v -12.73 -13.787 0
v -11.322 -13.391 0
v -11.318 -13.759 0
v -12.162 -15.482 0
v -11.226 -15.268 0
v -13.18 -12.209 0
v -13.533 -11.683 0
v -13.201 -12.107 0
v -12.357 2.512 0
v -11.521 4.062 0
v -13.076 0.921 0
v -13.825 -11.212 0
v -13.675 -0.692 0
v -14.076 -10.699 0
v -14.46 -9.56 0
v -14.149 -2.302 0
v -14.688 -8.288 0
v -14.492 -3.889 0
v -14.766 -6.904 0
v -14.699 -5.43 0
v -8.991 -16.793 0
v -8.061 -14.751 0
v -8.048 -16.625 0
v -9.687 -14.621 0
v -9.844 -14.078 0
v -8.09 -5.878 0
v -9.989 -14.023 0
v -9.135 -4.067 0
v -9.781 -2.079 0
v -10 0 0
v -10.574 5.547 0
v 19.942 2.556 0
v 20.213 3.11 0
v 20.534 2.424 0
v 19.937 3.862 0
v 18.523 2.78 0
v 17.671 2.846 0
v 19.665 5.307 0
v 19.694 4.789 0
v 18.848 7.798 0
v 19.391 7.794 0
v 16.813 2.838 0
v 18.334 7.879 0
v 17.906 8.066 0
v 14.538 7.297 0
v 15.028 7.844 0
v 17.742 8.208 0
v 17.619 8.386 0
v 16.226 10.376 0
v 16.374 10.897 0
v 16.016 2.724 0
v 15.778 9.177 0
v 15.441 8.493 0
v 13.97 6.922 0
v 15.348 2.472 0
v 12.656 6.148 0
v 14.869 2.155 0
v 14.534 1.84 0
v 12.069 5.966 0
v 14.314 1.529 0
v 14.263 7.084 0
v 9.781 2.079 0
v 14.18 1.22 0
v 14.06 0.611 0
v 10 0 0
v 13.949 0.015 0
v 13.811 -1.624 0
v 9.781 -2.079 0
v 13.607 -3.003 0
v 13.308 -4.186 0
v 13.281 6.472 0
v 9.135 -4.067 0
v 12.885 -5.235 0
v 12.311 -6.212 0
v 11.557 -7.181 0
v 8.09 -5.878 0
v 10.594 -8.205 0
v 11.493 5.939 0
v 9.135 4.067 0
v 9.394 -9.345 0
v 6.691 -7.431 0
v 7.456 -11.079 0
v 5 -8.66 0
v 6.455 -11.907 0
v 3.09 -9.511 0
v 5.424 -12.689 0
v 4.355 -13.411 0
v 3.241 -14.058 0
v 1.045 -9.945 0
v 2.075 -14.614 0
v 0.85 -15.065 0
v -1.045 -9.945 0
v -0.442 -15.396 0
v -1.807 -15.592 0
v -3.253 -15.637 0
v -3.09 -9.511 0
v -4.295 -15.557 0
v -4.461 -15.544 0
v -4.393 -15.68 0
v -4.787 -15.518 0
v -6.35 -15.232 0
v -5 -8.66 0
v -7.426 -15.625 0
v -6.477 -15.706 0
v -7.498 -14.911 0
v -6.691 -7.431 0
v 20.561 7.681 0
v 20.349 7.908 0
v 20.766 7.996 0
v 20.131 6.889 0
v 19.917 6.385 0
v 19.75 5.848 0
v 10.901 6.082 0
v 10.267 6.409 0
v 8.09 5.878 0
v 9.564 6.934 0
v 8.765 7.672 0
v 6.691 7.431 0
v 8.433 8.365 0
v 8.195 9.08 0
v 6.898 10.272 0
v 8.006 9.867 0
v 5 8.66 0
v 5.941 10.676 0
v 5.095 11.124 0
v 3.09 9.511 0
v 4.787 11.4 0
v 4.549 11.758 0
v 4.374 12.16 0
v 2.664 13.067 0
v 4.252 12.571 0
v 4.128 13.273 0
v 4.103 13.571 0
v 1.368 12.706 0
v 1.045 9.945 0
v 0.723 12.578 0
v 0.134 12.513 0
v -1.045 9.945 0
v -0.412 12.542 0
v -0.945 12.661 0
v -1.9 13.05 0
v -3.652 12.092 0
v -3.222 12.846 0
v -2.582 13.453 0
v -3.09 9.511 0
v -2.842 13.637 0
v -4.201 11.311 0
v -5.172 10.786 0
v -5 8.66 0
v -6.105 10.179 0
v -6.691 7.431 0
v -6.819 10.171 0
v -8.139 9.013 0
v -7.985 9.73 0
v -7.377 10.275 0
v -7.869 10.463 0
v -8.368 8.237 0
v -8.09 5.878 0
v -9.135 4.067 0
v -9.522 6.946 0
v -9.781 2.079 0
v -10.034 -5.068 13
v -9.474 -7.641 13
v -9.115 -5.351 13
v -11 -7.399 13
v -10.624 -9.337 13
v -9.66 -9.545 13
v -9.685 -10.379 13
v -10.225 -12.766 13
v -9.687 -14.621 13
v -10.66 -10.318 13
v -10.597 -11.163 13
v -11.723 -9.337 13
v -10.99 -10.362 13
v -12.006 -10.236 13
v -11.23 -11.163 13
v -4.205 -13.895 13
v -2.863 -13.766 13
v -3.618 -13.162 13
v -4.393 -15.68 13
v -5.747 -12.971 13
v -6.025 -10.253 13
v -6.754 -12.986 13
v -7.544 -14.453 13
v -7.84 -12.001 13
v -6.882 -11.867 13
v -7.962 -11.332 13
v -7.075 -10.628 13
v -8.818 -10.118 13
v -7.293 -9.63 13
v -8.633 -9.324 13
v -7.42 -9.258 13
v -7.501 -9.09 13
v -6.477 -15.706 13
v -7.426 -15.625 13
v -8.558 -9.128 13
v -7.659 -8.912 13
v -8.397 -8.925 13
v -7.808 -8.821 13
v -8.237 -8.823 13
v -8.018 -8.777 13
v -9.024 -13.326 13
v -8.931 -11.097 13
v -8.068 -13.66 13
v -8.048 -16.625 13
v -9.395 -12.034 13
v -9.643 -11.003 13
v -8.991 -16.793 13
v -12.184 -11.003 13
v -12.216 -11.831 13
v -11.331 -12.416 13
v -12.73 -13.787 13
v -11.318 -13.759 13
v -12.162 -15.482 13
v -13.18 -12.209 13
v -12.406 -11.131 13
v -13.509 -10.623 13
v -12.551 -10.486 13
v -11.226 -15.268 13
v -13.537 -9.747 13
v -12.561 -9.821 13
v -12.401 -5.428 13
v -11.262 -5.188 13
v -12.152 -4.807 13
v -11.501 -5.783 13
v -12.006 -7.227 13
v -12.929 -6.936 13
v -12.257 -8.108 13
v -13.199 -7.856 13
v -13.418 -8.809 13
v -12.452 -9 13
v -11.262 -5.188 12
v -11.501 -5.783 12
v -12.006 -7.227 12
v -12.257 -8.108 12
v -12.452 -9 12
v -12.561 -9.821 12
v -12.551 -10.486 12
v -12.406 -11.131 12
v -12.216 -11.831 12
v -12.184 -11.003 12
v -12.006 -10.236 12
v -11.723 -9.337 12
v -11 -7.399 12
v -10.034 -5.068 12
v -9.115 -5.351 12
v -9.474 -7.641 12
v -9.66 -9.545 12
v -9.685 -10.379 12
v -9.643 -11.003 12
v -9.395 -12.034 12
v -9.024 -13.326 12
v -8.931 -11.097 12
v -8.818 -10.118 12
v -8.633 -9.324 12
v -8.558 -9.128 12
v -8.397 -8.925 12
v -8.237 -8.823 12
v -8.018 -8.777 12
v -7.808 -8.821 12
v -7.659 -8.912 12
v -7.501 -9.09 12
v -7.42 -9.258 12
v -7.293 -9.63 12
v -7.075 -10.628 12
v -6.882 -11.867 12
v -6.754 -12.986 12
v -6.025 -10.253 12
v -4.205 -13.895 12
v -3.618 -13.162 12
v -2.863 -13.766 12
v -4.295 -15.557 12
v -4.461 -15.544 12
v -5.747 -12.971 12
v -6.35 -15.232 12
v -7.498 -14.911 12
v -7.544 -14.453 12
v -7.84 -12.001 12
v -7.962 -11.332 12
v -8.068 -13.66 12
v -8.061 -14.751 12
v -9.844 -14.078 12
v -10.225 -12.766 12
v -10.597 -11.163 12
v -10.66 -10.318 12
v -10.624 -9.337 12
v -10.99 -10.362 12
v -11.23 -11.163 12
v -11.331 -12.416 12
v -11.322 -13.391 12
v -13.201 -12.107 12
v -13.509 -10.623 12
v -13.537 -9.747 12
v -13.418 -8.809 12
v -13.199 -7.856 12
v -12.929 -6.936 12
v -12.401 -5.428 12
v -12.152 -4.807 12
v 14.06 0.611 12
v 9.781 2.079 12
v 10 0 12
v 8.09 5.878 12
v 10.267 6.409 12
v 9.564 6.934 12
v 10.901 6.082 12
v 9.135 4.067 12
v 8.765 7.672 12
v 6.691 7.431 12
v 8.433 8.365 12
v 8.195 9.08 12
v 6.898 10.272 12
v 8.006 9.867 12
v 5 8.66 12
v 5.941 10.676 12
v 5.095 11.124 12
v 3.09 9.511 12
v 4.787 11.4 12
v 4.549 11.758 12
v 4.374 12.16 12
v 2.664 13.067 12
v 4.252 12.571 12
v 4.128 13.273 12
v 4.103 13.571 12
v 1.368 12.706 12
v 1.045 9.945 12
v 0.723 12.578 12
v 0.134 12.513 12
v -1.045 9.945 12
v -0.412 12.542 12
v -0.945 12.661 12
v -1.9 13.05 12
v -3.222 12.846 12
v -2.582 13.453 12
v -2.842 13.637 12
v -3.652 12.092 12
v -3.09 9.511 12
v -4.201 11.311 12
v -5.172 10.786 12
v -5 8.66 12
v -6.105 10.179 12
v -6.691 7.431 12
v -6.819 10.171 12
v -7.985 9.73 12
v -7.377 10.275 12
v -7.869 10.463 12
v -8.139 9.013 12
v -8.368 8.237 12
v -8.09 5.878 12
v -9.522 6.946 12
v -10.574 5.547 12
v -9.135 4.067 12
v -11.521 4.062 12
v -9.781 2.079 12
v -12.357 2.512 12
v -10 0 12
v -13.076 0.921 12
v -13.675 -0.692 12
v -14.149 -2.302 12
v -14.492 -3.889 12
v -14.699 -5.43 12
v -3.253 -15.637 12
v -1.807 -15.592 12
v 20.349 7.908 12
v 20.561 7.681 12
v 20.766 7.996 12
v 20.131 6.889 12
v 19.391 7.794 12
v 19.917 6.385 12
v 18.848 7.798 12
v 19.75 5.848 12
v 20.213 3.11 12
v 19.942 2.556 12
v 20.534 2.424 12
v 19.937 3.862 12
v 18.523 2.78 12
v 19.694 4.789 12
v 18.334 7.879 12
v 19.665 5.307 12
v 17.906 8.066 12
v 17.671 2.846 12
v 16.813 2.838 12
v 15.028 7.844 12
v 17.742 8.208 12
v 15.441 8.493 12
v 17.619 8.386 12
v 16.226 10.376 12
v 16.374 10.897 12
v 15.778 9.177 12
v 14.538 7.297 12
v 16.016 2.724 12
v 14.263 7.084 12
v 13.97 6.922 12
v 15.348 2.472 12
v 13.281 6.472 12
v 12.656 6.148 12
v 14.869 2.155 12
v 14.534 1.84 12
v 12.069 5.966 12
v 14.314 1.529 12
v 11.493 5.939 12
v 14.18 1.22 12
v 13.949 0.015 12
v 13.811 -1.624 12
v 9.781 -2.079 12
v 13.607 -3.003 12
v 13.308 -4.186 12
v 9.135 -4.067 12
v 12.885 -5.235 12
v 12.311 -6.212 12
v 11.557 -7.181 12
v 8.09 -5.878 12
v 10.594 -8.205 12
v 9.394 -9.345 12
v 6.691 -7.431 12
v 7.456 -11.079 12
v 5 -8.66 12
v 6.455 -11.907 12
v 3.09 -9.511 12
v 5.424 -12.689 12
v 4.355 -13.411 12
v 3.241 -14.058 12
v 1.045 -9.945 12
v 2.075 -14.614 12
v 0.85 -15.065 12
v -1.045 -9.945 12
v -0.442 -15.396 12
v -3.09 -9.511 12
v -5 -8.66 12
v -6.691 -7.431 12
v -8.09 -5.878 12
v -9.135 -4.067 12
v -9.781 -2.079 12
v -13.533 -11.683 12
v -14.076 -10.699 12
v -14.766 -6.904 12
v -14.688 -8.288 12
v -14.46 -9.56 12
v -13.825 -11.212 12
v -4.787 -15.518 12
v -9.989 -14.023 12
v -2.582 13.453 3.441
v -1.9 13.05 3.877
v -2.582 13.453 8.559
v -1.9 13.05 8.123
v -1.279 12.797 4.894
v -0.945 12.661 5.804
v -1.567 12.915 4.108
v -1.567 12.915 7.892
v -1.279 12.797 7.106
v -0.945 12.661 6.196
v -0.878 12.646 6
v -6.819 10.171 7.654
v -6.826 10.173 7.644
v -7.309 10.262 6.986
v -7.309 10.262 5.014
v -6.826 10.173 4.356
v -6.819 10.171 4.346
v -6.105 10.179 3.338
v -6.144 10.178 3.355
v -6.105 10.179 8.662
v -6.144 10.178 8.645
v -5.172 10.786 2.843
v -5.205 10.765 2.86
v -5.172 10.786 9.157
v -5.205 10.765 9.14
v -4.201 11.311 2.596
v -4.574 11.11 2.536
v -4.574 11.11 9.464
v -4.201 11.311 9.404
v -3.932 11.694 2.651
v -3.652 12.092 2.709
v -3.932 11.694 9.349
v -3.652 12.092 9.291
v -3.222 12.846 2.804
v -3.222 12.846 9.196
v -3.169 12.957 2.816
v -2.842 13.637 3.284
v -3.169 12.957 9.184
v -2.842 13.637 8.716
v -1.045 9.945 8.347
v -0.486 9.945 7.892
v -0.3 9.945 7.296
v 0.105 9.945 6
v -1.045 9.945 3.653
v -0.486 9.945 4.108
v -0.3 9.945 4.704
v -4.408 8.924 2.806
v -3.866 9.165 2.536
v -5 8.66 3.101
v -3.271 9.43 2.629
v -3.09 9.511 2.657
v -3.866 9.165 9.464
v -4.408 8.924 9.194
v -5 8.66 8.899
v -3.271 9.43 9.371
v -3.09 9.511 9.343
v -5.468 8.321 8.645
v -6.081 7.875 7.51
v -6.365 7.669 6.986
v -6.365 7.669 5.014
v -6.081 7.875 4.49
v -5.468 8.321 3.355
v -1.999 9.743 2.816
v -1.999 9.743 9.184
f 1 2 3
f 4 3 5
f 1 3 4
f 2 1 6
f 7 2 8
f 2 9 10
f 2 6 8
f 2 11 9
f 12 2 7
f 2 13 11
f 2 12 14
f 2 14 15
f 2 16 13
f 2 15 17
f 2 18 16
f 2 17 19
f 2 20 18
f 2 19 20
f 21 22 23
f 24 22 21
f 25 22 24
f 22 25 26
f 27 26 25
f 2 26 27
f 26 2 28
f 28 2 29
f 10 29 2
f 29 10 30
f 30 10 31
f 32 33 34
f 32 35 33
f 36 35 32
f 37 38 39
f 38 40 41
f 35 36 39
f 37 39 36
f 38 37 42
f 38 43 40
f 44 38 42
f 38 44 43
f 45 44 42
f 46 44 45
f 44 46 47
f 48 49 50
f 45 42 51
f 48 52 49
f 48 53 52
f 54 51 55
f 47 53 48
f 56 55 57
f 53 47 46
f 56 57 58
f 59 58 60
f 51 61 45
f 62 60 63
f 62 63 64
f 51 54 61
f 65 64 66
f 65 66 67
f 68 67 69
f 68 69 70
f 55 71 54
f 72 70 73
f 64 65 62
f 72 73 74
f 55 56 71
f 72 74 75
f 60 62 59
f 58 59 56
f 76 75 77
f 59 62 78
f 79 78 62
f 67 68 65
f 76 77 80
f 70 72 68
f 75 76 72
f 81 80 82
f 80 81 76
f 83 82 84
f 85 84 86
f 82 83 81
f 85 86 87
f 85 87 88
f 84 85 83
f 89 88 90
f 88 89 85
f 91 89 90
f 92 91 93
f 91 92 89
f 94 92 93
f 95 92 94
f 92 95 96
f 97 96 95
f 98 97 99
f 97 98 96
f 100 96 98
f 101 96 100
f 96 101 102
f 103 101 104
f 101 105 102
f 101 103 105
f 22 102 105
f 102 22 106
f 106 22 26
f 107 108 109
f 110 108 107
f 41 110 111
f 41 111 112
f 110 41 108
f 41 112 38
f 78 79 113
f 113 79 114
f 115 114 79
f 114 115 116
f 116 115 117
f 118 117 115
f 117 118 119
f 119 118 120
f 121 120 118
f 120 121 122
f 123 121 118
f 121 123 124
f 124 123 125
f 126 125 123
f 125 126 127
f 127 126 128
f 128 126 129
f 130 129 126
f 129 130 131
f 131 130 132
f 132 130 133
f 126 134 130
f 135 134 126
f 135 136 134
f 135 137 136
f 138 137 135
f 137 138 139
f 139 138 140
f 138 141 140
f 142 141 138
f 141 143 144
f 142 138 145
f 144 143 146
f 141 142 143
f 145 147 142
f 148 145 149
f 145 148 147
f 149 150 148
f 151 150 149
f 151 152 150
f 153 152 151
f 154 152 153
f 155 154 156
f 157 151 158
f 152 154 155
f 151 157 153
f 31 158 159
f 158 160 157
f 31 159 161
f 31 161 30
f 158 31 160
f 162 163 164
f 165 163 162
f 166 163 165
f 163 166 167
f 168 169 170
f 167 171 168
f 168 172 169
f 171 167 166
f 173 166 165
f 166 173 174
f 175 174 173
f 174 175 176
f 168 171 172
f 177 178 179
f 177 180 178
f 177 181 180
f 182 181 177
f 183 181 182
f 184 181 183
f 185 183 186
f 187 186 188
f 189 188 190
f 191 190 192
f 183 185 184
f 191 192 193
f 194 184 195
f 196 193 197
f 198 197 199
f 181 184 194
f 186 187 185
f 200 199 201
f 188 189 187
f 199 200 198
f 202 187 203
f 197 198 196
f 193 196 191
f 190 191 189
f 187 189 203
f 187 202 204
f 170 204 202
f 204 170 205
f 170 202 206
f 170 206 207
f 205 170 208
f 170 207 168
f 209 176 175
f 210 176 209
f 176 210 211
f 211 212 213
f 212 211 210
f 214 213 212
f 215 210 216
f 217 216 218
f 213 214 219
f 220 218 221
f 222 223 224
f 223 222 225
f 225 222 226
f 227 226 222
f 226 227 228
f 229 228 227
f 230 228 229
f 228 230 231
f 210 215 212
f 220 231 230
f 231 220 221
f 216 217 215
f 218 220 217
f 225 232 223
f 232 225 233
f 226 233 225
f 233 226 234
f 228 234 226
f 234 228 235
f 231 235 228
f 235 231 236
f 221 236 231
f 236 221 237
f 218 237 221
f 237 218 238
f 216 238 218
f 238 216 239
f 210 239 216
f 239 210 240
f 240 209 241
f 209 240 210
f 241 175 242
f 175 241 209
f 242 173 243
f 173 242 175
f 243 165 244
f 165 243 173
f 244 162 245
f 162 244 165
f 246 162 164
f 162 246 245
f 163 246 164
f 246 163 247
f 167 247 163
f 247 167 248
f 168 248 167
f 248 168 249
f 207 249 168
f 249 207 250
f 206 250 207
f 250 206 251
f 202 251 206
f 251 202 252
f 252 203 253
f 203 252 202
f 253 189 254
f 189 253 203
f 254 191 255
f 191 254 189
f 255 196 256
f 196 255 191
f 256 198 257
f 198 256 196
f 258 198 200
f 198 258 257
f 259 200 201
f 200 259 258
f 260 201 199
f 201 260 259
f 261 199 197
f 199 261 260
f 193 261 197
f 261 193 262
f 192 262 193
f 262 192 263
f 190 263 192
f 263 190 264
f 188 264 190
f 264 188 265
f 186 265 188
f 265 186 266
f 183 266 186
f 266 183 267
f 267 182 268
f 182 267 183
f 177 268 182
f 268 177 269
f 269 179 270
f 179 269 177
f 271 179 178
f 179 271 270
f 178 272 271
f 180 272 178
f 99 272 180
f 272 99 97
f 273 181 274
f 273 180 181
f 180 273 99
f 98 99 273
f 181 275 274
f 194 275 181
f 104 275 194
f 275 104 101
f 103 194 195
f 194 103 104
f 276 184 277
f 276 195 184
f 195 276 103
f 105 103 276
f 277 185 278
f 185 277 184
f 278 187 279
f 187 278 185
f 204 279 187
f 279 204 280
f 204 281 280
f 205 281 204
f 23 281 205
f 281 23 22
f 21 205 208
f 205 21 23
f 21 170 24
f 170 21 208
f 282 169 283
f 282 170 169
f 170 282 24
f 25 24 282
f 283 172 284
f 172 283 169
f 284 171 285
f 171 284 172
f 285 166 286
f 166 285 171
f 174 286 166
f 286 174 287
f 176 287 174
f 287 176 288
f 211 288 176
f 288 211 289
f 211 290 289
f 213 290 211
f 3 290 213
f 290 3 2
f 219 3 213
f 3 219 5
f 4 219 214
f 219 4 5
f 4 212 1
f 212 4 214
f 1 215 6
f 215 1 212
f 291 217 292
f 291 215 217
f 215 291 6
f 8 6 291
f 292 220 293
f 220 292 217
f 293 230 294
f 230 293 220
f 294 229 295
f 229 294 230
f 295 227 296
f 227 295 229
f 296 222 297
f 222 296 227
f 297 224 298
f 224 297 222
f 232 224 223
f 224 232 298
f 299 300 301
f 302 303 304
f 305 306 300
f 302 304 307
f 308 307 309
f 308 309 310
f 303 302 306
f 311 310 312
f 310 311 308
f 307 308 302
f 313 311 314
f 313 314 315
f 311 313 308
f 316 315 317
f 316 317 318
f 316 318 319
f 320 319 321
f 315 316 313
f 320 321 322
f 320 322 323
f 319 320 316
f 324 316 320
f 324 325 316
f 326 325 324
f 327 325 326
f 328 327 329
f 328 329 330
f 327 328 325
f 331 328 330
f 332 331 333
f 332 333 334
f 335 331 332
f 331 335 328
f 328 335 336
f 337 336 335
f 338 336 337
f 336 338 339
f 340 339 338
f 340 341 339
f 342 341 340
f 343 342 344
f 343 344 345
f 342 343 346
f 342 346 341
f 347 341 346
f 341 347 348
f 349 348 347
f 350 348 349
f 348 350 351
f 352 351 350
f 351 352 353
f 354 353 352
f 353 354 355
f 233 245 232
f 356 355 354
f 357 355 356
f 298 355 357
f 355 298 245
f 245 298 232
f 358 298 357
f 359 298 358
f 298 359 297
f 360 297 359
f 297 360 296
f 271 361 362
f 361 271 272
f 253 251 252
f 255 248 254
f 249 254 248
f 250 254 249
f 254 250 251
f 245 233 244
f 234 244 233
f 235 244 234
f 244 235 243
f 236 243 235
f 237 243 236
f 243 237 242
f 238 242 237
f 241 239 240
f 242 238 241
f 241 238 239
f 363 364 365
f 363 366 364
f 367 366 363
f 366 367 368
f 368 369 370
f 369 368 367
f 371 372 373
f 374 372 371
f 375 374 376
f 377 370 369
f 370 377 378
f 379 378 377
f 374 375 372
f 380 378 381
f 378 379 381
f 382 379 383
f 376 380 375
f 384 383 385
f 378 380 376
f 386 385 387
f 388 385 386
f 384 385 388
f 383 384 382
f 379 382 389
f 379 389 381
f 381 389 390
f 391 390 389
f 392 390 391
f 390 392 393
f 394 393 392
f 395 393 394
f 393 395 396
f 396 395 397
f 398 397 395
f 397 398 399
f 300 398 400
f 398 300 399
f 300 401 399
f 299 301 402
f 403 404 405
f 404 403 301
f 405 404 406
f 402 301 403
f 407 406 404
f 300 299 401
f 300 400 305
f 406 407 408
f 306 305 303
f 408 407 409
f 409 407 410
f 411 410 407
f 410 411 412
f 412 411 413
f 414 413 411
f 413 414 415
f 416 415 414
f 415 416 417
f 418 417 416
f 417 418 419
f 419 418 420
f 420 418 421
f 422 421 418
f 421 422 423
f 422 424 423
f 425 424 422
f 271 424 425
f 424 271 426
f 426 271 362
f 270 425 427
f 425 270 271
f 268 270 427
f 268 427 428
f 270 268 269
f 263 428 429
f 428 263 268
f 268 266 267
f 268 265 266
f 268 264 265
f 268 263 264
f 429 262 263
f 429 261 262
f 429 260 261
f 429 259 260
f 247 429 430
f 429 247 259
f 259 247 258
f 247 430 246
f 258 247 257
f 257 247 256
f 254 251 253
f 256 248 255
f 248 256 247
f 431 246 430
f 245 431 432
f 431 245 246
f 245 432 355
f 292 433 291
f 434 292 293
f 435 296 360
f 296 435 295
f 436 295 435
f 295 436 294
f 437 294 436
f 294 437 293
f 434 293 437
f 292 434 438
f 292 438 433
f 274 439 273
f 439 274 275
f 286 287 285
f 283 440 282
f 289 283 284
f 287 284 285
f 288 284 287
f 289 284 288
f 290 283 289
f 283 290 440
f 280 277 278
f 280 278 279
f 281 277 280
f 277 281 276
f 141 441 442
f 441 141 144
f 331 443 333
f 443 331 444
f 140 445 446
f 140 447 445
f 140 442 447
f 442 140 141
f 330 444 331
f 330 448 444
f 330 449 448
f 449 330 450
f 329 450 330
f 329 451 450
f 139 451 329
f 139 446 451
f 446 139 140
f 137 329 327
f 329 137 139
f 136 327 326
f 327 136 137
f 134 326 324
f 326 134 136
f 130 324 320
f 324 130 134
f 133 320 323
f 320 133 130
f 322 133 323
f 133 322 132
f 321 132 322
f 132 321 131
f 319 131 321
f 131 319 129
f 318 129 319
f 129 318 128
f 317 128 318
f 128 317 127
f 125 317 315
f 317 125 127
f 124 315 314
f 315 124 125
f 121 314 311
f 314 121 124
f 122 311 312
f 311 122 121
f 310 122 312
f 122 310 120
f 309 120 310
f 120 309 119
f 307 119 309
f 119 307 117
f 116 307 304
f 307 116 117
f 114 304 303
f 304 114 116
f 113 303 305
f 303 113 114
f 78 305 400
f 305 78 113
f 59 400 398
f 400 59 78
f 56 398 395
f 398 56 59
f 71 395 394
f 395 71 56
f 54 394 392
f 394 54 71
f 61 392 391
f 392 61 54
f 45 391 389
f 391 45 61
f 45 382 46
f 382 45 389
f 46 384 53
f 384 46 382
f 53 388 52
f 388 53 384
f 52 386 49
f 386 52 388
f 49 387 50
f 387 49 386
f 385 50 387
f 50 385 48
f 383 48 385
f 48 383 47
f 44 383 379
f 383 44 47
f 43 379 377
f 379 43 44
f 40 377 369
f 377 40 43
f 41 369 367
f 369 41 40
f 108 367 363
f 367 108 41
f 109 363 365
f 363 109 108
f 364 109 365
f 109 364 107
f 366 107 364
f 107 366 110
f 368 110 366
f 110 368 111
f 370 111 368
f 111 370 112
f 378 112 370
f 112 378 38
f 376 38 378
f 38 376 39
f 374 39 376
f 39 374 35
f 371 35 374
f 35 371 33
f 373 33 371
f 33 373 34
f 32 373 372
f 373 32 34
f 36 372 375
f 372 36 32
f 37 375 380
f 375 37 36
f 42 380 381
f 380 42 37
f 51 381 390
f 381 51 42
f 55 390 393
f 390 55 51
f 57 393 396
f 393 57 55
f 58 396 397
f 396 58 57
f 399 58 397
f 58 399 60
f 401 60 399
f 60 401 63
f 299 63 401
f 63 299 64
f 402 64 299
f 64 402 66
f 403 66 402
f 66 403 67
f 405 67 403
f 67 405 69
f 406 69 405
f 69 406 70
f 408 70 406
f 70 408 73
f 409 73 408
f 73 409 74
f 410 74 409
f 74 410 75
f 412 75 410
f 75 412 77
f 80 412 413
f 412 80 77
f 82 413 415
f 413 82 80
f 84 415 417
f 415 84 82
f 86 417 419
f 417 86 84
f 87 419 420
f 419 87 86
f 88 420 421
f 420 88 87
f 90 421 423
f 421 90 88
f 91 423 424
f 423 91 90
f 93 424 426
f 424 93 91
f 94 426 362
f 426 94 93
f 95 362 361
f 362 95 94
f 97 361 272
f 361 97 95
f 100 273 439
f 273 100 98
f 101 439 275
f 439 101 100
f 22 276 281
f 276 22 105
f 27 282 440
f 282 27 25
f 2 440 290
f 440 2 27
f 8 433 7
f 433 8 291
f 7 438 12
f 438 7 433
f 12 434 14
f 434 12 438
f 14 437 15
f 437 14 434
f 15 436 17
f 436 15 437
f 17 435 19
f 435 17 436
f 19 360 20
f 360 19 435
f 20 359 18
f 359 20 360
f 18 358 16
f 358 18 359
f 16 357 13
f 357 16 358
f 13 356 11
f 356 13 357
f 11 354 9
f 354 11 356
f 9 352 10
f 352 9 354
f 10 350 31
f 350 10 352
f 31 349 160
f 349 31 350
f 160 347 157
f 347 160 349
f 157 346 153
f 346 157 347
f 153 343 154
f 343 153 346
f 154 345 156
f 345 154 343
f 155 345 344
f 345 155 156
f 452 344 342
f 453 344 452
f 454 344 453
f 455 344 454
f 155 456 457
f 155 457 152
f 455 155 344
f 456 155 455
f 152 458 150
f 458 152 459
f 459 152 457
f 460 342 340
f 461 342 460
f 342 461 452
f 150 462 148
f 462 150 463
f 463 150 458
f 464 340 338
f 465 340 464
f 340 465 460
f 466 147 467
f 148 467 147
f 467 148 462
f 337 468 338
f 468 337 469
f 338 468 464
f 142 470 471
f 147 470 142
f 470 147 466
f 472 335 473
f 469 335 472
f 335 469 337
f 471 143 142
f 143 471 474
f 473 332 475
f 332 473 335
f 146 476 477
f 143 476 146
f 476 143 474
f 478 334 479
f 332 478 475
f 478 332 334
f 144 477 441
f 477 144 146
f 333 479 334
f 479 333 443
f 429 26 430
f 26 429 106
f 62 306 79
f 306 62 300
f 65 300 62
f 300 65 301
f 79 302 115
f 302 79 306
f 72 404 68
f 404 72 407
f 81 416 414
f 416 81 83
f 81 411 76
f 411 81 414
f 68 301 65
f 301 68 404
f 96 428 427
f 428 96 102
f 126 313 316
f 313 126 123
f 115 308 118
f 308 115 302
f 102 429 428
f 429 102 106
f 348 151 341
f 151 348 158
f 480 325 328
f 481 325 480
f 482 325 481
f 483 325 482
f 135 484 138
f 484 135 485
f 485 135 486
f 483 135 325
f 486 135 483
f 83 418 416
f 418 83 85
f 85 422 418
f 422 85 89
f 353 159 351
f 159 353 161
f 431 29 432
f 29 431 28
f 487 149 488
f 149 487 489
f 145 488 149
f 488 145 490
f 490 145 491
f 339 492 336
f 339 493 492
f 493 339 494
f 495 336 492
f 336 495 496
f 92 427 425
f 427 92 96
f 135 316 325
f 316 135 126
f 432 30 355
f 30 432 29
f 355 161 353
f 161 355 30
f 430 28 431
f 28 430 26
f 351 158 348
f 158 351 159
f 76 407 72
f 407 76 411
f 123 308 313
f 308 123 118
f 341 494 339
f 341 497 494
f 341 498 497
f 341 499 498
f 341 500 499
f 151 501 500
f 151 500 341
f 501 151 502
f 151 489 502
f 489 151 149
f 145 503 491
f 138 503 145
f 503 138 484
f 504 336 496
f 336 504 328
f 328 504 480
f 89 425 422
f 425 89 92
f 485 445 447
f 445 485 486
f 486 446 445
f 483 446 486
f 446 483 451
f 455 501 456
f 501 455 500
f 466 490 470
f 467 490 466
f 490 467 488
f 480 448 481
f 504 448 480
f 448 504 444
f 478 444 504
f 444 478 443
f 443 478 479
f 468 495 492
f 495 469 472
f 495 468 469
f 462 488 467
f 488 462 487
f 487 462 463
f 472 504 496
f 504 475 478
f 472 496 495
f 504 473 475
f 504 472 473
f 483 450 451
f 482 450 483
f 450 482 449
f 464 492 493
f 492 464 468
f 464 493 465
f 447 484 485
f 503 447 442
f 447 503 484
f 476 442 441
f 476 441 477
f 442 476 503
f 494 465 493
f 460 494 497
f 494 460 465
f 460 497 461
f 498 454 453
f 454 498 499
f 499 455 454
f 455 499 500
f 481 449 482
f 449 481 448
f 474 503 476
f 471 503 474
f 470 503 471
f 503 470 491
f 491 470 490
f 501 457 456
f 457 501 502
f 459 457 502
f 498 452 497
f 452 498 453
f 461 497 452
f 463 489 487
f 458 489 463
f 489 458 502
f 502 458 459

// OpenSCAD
// file: anglerfish_00.scad
// Generated by inkscape 0.92.5 (2060ec1f9f, 2020-04-08) + inkscape-paths2openscad 0.25
// Sun Feb  7 17:20:35 2021 from "anglerfish.svg"

// Module names are of the form poly_<inkscape-path-id>().  As a result,
// you can associate a polygon in this OpenSCAD program with the corresponding
// SVG element in the Inkscape document by looking for the XML element with
// the attribute id="inkscape-path-id".

// fudge value is used to ensure that subtracted solids are a tad taller
// in the z dimension than the polygon being subtracted from.  This helps
// keep the resulting .stl file manifold.
fudge = 0.1;
zsize = 12;
line_fn = 4;
min_line_width = 1.0;
line_width_scale = 1.0;
function min_line_mm(w) = max(min_line_width, w * line_width_scale) * 96/25.4;


path815_0_center = [-36.661346,-12.351608];
path815_0_points = [[-130.947070,-12.351608],[-130.117912,-0.051788],[-127.683325,11.876461],[-123.722637,23.297819],[-118.315178,34.076966],[-111.540276,44.078582],[-103.477262,53.167346],[-94.205462,61.207940],[-83.804208,68.065041],[-72.573796,73.507760],[-60.867409,77.395416],[-48.843707,79.728009],[-36.661346,80.505540],[-24.478986,79.728009],[-12.455283,77.395416],[-0.748897,73.507760],[10.481515,68.065041],[20.882770,61.207940],[30.154569,53.167346],[38.217584,44.078582],[44.992485,34.076966],[50.399944,23.297819],[54.360632,11.876461],[56.795219,-0.051788],[57.624377,-12.351608],[56.795219,-24.651428],[54.360632,-36.579677],[50.399944,-48.001035],[44.992485,-58.780182],[38.217584,-68.781798],[30.154569,-77.870563],[20.882770,-85.911156],[10.481515,-92.768258],[-0.748897,-98.210976],[-12.455283,-102.098632],[-24.478986,-104.431225],[-36.661346,-105.208757],[-48.843707,-104.431225],[-60.867409,-102.098632],[-72.573796,-98.210976],[-83.804208,-92.768258],[-94.205462,-85.911156],[-103.477262,-77.870563],[-111.540276,-68.781798],[-118.315178,-58.780182],[-123.722637,-48.001035],[-127.683325,-36.579677],[-130.117912,-24.651428],[-130.947070,-12.351608]];
module poly_path815(h, w, s, res=line_fn)
{
  scale([25.4/96, -25.4/96, 1]) union()
  {
    translate (path815_0_center) linear_extrude(height=h, convexity=10, scale=0.01*s)
      translate (-path815_0_center) polygon(path815_0_points);
  }
}

path821_0_center = [-0.000000,0.000000];
path821_0_points = [[144.419765,-128.474221],[142.819017,-122.850026],[137.987891,-109.898933],[134.347398,-102.513999],[129.883064,-95.503180],[124.589474,-89.601756],[121.630015,-87.296842],[118.461212,-85.545006],[111.021412,-80.683102],[104.275289,-77.191014],[97.935065,-75.222972],[91.712963,-74.933203],[85.321205,-76.475934],[78.472013,-80.005393],[70.877609,-85.675808],[62.250216,-93.641407],[58.663896,-101.124570],[56.102250,-108.855389],[54.052945,-117.352340],[42.089075,-121.726781],[31.754541,-126.090237],[22.625212,-130.922651],[19.293714,-133.904005],[16.732266,-137.764344],[14.840434,-142.110226],[13.517786,-146.548211],[12.178306,-154.126722],[11.910361,-157.352344],[-3.625492,-151.905357],[-17.621124,-148.009883],[-24.593813,-146.618852],[-30.947064,-145.922653],[-36.839911,-146.239325],[-42.598809,-147.518590],[-52.911215,-151.726084],[-60.277191,-156.067509],[-63.089647,-158.065234],[-67.189742,-149.513970],[-71.829269,-141.380304],[-77.763479,-132.946091],[-88.248925,-127.274612],[-98.325981,-120.713670],[-106.030338,-120.635960],[-112.053040,-121.751909],[-117.374803,-123.780080],[-118.618143,-115.872226],[-120.288027,-108.123306],[-122.759573,-99.742968],[-135.218748,-85.805883],[-146.585675,-70.699610],[-156.807439,-54.661546],[-165.831126,-37.929089],[-173.603819,-20.739635],[-180.072604,-3.330582],[-185.184564,14.060674],[-188.886786,31.196736],[-191.126353,47.840206],[-191.850350,63.753687],[-191.005861,78.699782],[-188.539973,92.441095],[-184.399768,104.740227],[-181.685262,110.274790],[-178.532333,115.359783],[-174.934367,119.965533],[-170.884751,124.062365],[-166.376869,127.620604],[-161.404107,130.610576],[-140.263814,140.628656],[-120.383125,148.222149],[-101.684621,153.552066],[-84.090883,156.779424],[-67.524492,158.065234],[-51.908027,157.570511],[-37.164070,155.456269],[-23.215202,151.883521],[-9.984002,147.013281],[2.606948,141.006563],[14.635069,134.024380],[26.177778,126.227747],[37.312496,117.777677],[48.116642,108.835184],[69.042897,90.116982],[82.000599,77.800271],[92.399750,66.748149],[100.546878,56.282979],[106.748512,45.727125],[111.311181,34.402951],[114.541413,21.632822],[116.745737,6.739101],[118.230682,-10.955849],[119.434650,-17.398378],[120.730035,-23.972311],[122.173184,-27.307033],[124.552600,-30.672779],[128.172753,-34.068942],[133.338113,-37.494911],[140.558297,-40.214945],[149.161913,-41.443179],[158.425842,-41.527631],[167.626963,-40.816322],[182.948300,-38.398495],[189.340959,-36.973851],[185.880741,-44.387611],[182.899155,-52.497963],[180.277638,-62.515654],[179.954594,-68.105276],[180.880523,-73.953569],[182.683742,-79.751093],[184.992570,-85.188413],[189.640329,-93.744685],[191.850350,-97.146888],[187.344322,-96.198257],[177.002490,-94.968414],[171.132017,-95.005559],[165.589236,-95.881427],[160.969693,-97.899027],[159.192244,-99.430667],[157.868936,-101.361368],[144.419765,-128.474221],[144.419765,-128.474221]];
module poly_path821(h, w, s, res=line_fn)
{
  scale([25.4/96, -25.4/96, 1]) union()
  {
    translate (path821_0_center) linear_extrude(height=h, convexity=10, scale=0.01*s)
      translate (-path821_0_center) polygon(path821_0_points);
  }
}

module anglerfish_00(h)
{
  difference()
  {
    union()
    {
      translate ([0,0,0]) poly_path815(h, min_line_mm(1.0), 100.0);
      translate ([0,0,0]) poly_path821(h, min_line_mm(0.264583317458), 100.0);
    }
    union()
    {
    }
  }
}

anglerfish_00(zsize);
// file: anglerfish_01.scad
// Generated by inkscape 0.92.5 (2060ec1f9f, 2020-04-08) + inkscape-paths2openscad 0.25
// Sun Feb  7 17:20:58 2021 from "anglerfish.svg"

// Module names are of the form poly_<inkscape-path-id>().  As a result,
// you can associate a polygon in this OpenSCAD program with the corresponding
// SVG element in the Inkscape document by looking for the XML element with
// the attribute id="inkscape-path-id".

// fudge value is used to ensure that subtracted solids are a tad taller
// in the z dimension than the polygon being subtracted from.  This helps
// keep the resulting .stl file manifold.
fudge = 0.1;
zsize01 = 13;
line_fn = 4;
min_line_width = 1.0;
line_width_scale = 1.0;
function min_line_mm(w) = max(min_line_width, w * line_width_scale) * 96/25.4;


path823_0_center = [0.000000,0.000000];
path823_0_points = [[-42.676914,-64.713343],[-45.367714,-58.010931],[-51.070123,-41.726140],[-53.981942,-31.793452],[-56.345017,-21.503832],[-57.635606,-11.372726],[-57.329967,-1.915578],[-53.780553,15.215065],[-48.920872,32.259330],[-42.780262,50.554891],[-32.674450,48.251760],[-33.675161,31.955314],[-33.812708,17.448860],[-32.718746,3.916120],[-30.127652,-4.730774],[-26.178390,-15.800922],[-26.560137,-5.206569],[-25.883096,3.916120],[-21.870405,21.235504],[-16.054572,41.265680],[-8.543037,64.713343],[1.636593,62.897431],[1.429890,30.889515],[2.574082,5.746810],[3.888061,12.966313],[7.088146,39.449934],[8.354103,52.105102],[18.607550,52.976170],[26.484026,23.441200],[41.107553,52.695653],[57.635606,32.033730],[49.478618,25.508148],[43.144956,33.421535],[23.486981,-5.901809],[15.617883,23.610976],[14.237471,11.519434],[12.149726,-1.853358],[9.793574,-12.634093],[8.420543,-16.649841],[7.544316,-18.463301],[5.844262,-20.385073],[4.234707,-21.367443],[1.961386,-21.846692],[-0.397069,-21.345489],[-2.128180,-20.252185],[-3.866363,-18.058216],[-4.674932,-15.941180],[-6.668284,-7.360331],[-7.898824,3.212070],[-8.897375,27.279802],[-12.901936,13.321764],[-15.577986,2.196133],[-16.034078,-4.541586],[-15.768817,-13.552556],[-13.762040,-34.115380],[-9.879164,-58.837349],[-19.800425,-61.893437],[-30.231038,-36.721214],[-38.040150,-15.802400],[-41.096365,-6.087409],[-43.023856,2.196133],[-43.370817,11.135586],[-45.422757,3.577243],[-46.987942,-3.391975],[-47.095194,-10.576613],[-45.919144,-19.432424],[-43.806651,-29.067224],[-41.104574,-38.588830],[-35.644511,-54.179038],[-33.065696,-60.601632],[-42.676914,-64.713343]];
module poly_path823(h, w, s, res=line_fn)
{
  scale([25.4/96, -25.4/96, 1]) union()
  {
    translate (path823_0_center) linear_extrude(height=h, convexity=10, scale=0.01*s)
      translate (-path823_0_center) polygon(path823_0_points);
  }
}

module anglerfish_01(h)
{
  difference()
  {
    union()
    {
      translate ([0,0,0]) poly_path823(h, min_line_mm(2.7650001), 100.0);
    }
    union()
    {
    }
  }
}

anglerfish_01(zsize01);
// main file
module teeth(){
    include <anglerfish_01.scad>;
}
module fish(){
    translate([-32, -28, 0 ]) color("blue") teeth();
    include <anglerfish_00.scad>;
}

difference(){
    translate([3, -1]) scale([0.35, 0.35, 1]) fish();
    union(){
        translate([0, 0, -0.1]) cylinder(r=10,h=14);
        translate([0, 0, 6]) rotate([-90, 0, 20]) cylinder(r=3.5, h=30);
    }
}
